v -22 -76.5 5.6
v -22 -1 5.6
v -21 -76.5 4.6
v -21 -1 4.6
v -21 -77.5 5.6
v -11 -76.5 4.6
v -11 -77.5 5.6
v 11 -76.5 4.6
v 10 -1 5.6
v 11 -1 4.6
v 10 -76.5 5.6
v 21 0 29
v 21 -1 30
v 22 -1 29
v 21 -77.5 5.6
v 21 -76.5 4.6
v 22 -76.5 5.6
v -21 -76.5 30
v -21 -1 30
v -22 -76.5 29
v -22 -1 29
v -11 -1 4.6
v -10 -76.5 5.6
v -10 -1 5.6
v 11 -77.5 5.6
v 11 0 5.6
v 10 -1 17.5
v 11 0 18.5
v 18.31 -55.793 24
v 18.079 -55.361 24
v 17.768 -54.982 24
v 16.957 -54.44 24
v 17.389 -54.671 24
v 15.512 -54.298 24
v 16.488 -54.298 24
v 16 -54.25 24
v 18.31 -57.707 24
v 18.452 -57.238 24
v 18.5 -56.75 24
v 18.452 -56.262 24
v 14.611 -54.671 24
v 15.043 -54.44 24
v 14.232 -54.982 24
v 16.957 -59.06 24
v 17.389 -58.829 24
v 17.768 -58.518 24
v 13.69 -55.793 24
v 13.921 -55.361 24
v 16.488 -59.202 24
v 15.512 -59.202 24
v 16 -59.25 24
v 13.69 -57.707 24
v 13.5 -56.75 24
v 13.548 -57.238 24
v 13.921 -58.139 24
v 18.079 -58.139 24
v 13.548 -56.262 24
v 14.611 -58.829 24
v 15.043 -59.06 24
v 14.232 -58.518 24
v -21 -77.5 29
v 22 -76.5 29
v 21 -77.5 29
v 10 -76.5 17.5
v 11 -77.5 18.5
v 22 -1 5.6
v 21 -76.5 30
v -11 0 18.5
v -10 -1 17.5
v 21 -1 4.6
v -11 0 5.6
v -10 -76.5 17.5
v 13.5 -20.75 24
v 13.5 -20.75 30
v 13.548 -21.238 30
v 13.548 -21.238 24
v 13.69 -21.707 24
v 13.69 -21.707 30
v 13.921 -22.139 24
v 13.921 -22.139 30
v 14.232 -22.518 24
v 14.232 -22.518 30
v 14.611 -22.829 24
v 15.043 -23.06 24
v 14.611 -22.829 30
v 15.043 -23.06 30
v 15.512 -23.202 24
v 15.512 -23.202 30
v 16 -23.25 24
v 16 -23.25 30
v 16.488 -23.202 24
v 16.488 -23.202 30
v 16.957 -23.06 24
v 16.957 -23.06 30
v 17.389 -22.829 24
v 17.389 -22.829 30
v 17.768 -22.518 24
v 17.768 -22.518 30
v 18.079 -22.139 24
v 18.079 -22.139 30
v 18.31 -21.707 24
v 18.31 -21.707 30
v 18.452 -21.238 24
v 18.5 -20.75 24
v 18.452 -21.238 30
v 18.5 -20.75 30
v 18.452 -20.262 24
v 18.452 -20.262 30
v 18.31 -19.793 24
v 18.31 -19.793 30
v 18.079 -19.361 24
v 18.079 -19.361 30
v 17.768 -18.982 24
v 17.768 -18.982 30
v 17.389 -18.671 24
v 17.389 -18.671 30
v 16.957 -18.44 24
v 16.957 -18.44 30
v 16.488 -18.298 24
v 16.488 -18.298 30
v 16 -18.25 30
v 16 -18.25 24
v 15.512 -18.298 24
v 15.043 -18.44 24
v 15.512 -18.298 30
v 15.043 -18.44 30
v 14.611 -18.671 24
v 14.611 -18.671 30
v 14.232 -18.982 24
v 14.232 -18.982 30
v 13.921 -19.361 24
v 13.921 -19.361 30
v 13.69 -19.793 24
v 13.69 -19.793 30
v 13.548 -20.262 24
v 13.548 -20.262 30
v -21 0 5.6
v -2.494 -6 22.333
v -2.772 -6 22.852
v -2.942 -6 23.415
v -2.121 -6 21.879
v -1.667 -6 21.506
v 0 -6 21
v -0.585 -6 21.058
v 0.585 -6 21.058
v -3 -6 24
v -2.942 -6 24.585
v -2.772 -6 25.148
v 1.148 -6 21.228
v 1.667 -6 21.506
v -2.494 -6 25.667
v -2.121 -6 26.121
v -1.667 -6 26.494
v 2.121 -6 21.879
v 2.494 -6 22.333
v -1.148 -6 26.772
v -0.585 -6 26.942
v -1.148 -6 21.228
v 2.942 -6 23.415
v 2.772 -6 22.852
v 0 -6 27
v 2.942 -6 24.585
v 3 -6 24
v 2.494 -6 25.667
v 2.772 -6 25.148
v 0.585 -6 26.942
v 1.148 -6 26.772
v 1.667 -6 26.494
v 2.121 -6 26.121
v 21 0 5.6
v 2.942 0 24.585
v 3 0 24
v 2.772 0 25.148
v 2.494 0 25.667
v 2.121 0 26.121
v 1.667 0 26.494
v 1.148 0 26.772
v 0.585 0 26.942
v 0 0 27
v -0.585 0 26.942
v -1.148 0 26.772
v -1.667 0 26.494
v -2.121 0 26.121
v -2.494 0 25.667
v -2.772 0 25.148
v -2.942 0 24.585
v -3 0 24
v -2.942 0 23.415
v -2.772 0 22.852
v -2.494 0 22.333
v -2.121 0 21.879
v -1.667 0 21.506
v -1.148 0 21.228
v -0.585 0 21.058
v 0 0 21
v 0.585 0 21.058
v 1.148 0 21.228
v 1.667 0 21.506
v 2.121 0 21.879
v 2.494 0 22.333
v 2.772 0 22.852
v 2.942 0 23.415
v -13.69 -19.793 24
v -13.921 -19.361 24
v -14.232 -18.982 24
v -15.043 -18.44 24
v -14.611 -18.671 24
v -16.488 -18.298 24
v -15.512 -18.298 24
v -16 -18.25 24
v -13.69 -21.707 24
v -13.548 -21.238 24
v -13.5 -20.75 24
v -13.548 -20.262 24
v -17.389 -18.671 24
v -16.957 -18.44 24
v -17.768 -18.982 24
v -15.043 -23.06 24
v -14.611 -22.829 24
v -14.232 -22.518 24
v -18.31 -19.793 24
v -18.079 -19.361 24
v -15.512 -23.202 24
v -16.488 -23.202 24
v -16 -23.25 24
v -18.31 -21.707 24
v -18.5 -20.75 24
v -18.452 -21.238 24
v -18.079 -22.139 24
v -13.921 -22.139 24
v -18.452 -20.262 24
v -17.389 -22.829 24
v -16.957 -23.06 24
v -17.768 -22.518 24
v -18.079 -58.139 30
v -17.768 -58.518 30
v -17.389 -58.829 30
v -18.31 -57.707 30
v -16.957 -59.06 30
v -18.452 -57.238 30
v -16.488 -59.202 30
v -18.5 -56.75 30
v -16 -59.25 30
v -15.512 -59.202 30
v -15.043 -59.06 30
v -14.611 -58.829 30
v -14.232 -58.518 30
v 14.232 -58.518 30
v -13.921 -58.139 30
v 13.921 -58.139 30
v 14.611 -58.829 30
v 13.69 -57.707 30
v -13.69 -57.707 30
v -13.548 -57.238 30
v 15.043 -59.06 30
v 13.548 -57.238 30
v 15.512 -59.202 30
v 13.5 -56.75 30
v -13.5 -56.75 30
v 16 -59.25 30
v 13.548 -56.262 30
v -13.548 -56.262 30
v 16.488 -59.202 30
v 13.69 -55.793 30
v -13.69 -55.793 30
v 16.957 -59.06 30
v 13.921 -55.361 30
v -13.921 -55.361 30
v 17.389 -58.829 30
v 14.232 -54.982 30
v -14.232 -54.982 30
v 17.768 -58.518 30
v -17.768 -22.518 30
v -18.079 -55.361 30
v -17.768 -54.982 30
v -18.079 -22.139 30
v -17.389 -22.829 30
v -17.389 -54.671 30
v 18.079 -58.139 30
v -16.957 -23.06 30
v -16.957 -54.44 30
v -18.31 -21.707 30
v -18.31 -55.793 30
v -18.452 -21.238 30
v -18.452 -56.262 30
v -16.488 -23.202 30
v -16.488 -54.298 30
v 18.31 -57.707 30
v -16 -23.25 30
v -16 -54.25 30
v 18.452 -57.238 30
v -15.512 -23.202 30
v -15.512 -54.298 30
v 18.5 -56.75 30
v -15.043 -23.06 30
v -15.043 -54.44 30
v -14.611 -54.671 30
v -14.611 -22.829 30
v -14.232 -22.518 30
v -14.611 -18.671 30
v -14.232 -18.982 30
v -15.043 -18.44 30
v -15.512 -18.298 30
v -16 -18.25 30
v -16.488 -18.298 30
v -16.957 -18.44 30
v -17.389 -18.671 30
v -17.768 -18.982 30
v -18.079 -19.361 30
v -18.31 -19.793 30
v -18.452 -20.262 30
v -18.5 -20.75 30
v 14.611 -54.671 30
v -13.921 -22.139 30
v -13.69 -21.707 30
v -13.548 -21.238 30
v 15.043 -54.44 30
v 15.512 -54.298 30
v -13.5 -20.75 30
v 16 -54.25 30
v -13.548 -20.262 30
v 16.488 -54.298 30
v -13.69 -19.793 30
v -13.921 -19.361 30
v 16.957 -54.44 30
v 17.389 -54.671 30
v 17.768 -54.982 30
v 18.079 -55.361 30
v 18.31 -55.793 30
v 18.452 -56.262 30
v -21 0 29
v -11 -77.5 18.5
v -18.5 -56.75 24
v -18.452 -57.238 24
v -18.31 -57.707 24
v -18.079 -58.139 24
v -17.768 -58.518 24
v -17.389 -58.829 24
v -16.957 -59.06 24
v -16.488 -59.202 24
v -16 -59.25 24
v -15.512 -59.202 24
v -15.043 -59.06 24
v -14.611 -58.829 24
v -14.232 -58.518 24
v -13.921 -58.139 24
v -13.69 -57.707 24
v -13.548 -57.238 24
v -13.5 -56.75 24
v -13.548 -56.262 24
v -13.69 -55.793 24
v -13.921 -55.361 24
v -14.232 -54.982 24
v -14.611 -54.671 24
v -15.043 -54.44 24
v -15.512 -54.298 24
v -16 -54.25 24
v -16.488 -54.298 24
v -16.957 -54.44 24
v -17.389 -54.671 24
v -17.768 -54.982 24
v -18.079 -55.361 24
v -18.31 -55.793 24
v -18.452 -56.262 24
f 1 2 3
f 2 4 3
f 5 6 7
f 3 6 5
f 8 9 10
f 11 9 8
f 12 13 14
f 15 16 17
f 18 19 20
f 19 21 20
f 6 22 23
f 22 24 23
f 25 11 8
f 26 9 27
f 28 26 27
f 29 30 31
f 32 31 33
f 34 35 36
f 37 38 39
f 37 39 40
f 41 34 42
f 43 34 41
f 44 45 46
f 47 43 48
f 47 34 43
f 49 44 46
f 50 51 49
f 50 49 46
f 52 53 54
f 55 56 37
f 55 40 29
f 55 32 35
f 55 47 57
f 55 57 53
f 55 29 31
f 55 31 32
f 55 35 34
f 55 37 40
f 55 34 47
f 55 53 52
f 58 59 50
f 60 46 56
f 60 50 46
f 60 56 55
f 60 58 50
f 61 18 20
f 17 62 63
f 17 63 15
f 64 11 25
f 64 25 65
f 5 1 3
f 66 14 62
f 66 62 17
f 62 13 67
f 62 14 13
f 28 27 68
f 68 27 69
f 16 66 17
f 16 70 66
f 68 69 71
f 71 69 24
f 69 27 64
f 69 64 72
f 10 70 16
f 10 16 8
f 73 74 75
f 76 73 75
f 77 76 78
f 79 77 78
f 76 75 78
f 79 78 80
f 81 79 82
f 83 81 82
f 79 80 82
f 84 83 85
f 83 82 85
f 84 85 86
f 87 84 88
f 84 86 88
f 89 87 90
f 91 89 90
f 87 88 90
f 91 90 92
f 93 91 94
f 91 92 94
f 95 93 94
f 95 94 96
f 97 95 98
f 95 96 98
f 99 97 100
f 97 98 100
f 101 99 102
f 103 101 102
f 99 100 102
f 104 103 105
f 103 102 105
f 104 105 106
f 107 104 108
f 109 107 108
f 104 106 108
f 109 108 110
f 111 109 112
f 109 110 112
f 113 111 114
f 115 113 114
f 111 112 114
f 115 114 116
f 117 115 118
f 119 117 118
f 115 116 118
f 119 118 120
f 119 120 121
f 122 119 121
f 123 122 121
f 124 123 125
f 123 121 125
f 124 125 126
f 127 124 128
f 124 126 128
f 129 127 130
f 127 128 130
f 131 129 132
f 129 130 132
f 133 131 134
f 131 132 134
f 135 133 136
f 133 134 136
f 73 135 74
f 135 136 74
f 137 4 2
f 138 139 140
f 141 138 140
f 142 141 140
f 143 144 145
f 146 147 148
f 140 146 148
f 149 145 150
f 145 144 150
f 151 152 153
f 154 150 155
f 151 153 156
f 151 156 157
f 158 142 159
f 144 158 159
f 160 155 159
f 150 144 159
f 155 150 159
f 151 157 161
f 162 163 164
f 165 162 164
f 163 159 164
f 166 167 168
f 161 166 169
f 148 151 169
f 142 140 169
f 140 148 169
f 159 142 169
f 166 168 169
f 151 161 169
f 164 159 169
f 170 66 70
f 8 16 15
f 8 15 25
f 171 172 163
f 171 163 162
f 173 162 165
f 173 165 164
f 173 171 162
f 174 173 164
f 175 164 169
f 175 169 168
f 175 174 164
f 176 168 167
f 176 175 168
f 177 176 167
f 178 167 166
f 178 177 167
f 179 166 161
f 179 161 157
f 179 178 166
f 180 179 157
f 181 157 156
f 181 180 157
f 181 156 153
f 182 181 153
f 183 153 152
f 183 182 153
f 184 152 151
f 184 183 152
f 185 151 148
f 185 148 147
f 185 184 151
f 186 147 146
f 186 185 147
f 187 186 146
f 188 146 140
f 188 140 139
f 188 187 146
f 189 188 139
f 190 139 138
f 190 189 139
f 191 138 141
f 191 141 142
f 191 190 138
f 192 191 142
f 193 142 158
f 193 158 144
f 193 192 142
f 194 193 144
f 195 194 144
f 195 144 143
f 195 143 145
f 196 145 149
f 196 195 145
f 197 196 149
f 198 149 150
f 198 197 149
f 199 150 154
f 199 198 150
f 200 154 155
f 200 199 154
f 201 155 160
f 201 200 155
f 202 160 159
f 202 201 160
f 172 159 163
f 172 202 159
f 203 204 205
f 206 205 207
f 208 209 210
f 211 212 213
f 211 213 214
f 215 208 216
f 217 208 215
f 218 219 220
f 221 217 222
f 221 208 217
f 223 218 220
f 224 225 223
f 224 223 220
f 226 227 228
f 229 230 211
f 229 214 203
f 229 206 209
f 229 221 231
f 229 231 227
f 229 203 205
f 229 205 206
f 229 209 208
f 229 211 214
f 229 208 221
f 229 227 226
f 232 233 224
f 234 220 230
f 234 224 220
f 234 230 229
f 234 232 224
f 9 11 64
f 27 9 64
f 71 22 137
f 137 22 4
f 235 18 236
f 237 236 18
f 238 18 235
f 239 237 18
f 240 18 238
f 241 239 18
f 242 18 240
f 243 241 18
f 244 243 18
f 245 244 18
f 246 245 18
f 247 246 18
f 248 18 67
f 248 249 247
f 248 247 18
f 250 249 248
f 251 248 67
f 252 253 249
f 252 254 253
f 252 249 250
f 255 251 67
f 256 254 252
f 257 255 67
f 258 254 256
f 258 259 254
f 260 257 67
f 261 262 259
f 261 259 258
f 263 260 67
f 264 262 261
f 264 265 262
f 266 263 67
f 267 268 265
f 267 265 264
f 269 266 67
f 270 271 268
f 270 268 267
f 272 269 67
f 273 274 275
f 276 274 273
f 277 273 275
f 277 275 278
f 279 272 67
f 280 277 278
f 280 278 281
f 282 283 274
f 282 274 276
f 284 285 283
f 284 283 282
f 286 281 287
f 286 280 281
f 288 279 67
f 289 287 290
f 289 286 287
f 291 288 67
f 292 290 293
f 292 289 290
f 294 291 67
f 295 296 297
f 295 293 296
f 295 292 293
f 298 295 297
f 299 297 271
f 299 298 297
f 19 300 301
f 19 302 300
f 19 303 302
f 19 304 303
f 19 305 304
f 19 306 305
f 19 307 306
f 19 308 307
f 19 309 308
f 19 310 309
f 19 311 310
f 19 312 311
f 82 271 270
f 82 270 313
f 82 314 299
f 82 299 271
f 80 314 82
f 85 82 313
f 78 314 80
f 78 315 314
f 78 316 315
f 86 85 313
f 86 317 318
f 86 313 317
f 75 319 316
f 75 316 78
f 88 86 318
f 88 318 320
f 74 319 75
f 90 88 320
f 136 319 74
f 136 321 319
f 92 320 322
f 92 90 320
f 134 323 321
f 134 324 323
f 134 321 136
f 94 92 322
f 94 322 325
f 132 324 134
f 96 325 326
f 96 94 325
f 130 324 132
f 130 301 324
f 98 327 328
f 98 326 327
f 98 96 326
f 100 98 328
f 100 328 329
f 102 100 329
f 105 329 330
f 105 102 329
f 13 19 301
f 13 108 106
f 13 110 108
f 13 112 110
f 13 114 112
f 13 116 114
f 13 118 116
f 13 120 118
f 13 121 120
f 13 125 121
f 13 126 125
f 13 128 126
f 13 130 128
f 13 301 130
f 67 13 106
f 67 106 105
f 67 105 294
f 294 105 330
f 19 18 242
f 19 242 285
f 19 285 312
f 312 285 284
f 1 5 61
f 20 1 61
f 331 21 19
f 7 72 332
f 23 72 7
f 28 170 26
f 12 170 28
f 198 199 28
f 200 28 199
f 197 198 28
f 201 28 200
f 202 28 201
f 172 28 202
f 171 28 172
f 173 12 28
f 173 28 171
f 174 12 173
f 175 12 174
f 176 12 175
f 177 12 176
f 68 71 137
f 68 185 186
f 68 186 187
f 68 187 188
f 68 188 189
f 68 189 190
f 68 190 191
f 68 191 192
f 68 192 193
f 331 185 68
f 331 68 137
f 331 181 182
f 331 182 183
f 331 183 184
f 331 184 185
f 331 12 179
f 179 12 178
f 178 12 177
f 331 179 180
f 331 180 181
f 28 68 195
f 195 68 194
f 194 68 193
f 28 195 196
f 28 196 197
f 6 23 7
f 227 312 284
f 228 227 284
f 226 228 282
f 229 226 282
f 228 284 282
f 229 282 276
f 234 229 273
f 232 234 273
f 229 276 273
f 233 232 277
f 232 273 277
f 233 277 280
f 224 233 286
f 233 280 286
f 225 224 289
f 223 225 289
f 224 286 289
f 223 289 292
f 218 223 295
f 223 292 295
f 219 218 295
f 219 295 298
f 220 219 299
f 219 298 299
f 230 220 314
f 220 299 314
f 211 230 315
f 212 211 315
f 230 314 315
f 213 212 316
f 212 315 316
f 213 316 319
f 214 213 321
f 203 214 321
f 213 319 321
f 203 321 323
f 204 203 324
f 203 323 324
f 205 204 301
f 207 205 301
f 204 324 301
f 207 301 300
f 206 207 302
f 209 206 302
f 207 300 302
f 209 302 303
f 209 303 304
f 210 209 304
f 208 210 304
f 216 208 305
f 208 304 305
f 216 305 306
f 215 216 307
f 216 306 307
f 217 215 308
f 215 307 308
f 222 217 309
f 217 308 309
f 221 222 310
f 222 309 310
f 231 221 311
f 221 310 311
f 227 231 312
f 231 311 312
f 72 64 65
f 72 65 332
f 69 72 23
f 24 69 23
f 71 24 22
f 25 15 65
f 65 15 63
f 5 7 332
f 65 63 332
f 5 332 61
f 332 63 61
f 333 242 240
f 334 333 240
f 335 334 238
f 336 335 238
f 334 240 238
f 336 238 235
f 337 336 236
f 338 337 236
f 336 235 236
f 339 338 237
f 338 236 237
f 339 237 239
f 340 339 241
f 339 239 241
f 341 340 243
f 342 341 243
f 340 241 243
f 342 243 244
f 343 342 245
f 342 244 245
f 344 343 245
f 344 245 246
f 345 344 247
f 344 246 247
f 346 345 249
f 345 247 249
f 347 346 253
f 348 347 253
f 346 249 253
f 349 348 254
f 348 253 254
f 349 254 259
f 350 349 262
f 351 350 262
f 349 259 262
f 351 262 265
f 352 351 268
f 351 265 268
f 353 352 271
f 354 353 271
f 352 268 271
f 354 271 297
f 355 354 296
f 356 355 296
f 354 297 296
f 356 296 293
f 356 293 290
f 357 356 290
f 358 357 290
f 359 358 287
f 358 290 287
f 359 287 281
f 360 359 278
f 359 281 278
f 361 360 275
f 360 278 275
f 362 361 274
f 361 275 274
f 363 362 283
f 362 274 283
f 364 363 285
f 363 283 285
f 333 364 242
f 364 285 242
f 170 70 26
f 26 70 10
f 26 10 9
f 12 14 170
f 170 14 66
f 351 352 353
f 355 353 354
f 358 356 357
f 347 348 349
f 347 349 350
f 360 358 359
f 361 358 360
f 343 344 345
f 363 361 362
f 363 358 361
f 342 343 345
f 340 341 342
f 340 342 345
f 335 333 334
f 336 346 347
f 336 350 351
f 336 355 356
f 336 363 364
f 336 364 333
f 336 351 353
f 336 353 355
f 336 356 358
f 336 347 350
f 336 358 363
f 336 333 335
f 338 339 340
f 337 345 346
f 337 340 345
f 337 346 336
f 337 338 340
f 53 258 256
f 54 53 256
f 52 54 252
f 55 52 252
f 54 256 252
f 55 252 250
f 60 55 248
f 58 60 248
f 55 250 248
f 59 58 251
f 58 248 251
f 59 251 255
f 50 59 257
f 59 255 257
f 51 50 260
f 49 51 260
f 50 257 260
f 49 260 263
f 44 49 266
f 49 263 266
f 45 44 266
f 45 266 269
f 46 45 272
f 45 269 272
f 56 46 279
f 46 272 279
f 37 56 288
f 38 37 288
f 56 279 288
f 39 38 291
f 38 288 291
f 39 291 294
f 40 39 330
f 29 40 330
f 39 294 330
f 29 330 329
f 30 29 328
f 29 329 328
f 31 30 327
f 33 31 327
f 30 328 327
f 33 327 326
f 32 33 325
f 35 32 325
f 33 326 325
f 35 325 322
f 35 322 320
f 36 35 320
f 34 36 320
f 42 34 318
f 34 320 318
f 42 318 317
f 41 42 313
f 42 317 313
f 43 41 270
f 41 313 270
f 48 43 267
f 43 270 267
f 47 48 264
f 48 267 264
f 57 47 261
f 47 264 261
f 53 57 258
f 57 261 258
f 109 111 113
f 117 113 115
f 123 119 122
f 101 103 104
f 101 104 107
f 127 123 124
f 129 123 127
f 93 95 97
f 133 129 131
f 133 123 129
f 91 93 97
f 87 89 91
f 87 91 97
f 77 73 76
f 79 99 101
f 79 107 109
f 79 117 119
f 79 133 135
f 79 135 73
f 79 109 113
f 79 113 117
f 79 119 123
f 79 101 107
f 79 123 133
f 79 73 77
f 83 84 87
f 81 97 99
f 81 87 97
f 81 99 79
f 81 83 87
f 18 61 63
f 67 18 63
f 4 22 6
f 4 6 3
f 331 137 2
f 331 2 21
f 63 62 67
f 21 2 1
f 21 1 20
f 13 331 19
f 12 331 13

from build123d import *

# Parameters (mm, degrees)
PAD_DEPTH       = 77.5
SKETCH001_R     = 2.5
POCKET_DEPTH    = 6
CHAMFER_SIZE    = 1
SKETCH002_R     = 3
POCKET001_DEPTH = 6


with BuildPart() as part:
    # Sketch → Pad (new body)
    with BuildSketch(Plane.XZ):
        Polygon((-22, 30), (22, 30), (22, 4.6), (10, 4.6), (10, 17.5), (-10, 17.5), (-10, 4.6), (-22, 4.6), align=None)
    extrude(amount=PAD_DEPTH)

    # Sketch001 (on Face3 of Pad) → Pocket (cut)
    with BuildSketch(Plane(origin=(0, 0, 30), x_dir=(-1, 0, 0), z_dir=(0, 0, 1))):
        with Locations((-16, 20.75)):
            Circle(SKETCH001_R)
        with Locations((16, 20.75)):
            Circle(SKETCH001_R)
        with Locations((16, 56.75)):
            Circle(SKETCH001_R)
        with Locations((-16, 56.75)):
            Circle(SKETCH001_R)
    extrude(amount=-POCKET_DEPTH, mode=Mode.SUBTRACT)

    # Chamfer
    chamfer_edges = [part.edges().sort_by_distance(p)[0] for p in [
        (22, -38.75, 4.6),
        (22, -38.75, 30),
        (-22, -38.75, 30),
        (-22, -38.75, 4.6),
        (-10, -38.75, 4.6),
        (10, -38.75, 4.6),
        (-10, -77.5, 11.05),
        (0, -77.5, 17.5),
        (10, -77.5, 11.05),
        (16, -77.5, 4.6),
        (22, -77.5, 17.3),
        (0, -77.5, 30),
        (-22, -77.5, 17.3),
        (-10, 0, 11.05),
        (-16, 0, 4.6),
        (-22, 0, 17.3),
        (0, 0, 30),
        (22, 0, 17.3),
        (16, 0, 4.6),
        (10, 0, 11.05),
        (0, 0, 17.5),
        (-16, -77.5, 4.6),
    ]]
    chamfer(chamfer_edges, length=CHAMFER_SIZE)

    # Sketch002 → Pocket001 (cut)
    with BuildSketch(Plane.XZ):
        with Locations((0, 24)):
            Circle(SKETCH002_R)
    extrude(amount=POCKET001_DEPTH, mode=Mode.SUBTRACT)


solid = part.part
